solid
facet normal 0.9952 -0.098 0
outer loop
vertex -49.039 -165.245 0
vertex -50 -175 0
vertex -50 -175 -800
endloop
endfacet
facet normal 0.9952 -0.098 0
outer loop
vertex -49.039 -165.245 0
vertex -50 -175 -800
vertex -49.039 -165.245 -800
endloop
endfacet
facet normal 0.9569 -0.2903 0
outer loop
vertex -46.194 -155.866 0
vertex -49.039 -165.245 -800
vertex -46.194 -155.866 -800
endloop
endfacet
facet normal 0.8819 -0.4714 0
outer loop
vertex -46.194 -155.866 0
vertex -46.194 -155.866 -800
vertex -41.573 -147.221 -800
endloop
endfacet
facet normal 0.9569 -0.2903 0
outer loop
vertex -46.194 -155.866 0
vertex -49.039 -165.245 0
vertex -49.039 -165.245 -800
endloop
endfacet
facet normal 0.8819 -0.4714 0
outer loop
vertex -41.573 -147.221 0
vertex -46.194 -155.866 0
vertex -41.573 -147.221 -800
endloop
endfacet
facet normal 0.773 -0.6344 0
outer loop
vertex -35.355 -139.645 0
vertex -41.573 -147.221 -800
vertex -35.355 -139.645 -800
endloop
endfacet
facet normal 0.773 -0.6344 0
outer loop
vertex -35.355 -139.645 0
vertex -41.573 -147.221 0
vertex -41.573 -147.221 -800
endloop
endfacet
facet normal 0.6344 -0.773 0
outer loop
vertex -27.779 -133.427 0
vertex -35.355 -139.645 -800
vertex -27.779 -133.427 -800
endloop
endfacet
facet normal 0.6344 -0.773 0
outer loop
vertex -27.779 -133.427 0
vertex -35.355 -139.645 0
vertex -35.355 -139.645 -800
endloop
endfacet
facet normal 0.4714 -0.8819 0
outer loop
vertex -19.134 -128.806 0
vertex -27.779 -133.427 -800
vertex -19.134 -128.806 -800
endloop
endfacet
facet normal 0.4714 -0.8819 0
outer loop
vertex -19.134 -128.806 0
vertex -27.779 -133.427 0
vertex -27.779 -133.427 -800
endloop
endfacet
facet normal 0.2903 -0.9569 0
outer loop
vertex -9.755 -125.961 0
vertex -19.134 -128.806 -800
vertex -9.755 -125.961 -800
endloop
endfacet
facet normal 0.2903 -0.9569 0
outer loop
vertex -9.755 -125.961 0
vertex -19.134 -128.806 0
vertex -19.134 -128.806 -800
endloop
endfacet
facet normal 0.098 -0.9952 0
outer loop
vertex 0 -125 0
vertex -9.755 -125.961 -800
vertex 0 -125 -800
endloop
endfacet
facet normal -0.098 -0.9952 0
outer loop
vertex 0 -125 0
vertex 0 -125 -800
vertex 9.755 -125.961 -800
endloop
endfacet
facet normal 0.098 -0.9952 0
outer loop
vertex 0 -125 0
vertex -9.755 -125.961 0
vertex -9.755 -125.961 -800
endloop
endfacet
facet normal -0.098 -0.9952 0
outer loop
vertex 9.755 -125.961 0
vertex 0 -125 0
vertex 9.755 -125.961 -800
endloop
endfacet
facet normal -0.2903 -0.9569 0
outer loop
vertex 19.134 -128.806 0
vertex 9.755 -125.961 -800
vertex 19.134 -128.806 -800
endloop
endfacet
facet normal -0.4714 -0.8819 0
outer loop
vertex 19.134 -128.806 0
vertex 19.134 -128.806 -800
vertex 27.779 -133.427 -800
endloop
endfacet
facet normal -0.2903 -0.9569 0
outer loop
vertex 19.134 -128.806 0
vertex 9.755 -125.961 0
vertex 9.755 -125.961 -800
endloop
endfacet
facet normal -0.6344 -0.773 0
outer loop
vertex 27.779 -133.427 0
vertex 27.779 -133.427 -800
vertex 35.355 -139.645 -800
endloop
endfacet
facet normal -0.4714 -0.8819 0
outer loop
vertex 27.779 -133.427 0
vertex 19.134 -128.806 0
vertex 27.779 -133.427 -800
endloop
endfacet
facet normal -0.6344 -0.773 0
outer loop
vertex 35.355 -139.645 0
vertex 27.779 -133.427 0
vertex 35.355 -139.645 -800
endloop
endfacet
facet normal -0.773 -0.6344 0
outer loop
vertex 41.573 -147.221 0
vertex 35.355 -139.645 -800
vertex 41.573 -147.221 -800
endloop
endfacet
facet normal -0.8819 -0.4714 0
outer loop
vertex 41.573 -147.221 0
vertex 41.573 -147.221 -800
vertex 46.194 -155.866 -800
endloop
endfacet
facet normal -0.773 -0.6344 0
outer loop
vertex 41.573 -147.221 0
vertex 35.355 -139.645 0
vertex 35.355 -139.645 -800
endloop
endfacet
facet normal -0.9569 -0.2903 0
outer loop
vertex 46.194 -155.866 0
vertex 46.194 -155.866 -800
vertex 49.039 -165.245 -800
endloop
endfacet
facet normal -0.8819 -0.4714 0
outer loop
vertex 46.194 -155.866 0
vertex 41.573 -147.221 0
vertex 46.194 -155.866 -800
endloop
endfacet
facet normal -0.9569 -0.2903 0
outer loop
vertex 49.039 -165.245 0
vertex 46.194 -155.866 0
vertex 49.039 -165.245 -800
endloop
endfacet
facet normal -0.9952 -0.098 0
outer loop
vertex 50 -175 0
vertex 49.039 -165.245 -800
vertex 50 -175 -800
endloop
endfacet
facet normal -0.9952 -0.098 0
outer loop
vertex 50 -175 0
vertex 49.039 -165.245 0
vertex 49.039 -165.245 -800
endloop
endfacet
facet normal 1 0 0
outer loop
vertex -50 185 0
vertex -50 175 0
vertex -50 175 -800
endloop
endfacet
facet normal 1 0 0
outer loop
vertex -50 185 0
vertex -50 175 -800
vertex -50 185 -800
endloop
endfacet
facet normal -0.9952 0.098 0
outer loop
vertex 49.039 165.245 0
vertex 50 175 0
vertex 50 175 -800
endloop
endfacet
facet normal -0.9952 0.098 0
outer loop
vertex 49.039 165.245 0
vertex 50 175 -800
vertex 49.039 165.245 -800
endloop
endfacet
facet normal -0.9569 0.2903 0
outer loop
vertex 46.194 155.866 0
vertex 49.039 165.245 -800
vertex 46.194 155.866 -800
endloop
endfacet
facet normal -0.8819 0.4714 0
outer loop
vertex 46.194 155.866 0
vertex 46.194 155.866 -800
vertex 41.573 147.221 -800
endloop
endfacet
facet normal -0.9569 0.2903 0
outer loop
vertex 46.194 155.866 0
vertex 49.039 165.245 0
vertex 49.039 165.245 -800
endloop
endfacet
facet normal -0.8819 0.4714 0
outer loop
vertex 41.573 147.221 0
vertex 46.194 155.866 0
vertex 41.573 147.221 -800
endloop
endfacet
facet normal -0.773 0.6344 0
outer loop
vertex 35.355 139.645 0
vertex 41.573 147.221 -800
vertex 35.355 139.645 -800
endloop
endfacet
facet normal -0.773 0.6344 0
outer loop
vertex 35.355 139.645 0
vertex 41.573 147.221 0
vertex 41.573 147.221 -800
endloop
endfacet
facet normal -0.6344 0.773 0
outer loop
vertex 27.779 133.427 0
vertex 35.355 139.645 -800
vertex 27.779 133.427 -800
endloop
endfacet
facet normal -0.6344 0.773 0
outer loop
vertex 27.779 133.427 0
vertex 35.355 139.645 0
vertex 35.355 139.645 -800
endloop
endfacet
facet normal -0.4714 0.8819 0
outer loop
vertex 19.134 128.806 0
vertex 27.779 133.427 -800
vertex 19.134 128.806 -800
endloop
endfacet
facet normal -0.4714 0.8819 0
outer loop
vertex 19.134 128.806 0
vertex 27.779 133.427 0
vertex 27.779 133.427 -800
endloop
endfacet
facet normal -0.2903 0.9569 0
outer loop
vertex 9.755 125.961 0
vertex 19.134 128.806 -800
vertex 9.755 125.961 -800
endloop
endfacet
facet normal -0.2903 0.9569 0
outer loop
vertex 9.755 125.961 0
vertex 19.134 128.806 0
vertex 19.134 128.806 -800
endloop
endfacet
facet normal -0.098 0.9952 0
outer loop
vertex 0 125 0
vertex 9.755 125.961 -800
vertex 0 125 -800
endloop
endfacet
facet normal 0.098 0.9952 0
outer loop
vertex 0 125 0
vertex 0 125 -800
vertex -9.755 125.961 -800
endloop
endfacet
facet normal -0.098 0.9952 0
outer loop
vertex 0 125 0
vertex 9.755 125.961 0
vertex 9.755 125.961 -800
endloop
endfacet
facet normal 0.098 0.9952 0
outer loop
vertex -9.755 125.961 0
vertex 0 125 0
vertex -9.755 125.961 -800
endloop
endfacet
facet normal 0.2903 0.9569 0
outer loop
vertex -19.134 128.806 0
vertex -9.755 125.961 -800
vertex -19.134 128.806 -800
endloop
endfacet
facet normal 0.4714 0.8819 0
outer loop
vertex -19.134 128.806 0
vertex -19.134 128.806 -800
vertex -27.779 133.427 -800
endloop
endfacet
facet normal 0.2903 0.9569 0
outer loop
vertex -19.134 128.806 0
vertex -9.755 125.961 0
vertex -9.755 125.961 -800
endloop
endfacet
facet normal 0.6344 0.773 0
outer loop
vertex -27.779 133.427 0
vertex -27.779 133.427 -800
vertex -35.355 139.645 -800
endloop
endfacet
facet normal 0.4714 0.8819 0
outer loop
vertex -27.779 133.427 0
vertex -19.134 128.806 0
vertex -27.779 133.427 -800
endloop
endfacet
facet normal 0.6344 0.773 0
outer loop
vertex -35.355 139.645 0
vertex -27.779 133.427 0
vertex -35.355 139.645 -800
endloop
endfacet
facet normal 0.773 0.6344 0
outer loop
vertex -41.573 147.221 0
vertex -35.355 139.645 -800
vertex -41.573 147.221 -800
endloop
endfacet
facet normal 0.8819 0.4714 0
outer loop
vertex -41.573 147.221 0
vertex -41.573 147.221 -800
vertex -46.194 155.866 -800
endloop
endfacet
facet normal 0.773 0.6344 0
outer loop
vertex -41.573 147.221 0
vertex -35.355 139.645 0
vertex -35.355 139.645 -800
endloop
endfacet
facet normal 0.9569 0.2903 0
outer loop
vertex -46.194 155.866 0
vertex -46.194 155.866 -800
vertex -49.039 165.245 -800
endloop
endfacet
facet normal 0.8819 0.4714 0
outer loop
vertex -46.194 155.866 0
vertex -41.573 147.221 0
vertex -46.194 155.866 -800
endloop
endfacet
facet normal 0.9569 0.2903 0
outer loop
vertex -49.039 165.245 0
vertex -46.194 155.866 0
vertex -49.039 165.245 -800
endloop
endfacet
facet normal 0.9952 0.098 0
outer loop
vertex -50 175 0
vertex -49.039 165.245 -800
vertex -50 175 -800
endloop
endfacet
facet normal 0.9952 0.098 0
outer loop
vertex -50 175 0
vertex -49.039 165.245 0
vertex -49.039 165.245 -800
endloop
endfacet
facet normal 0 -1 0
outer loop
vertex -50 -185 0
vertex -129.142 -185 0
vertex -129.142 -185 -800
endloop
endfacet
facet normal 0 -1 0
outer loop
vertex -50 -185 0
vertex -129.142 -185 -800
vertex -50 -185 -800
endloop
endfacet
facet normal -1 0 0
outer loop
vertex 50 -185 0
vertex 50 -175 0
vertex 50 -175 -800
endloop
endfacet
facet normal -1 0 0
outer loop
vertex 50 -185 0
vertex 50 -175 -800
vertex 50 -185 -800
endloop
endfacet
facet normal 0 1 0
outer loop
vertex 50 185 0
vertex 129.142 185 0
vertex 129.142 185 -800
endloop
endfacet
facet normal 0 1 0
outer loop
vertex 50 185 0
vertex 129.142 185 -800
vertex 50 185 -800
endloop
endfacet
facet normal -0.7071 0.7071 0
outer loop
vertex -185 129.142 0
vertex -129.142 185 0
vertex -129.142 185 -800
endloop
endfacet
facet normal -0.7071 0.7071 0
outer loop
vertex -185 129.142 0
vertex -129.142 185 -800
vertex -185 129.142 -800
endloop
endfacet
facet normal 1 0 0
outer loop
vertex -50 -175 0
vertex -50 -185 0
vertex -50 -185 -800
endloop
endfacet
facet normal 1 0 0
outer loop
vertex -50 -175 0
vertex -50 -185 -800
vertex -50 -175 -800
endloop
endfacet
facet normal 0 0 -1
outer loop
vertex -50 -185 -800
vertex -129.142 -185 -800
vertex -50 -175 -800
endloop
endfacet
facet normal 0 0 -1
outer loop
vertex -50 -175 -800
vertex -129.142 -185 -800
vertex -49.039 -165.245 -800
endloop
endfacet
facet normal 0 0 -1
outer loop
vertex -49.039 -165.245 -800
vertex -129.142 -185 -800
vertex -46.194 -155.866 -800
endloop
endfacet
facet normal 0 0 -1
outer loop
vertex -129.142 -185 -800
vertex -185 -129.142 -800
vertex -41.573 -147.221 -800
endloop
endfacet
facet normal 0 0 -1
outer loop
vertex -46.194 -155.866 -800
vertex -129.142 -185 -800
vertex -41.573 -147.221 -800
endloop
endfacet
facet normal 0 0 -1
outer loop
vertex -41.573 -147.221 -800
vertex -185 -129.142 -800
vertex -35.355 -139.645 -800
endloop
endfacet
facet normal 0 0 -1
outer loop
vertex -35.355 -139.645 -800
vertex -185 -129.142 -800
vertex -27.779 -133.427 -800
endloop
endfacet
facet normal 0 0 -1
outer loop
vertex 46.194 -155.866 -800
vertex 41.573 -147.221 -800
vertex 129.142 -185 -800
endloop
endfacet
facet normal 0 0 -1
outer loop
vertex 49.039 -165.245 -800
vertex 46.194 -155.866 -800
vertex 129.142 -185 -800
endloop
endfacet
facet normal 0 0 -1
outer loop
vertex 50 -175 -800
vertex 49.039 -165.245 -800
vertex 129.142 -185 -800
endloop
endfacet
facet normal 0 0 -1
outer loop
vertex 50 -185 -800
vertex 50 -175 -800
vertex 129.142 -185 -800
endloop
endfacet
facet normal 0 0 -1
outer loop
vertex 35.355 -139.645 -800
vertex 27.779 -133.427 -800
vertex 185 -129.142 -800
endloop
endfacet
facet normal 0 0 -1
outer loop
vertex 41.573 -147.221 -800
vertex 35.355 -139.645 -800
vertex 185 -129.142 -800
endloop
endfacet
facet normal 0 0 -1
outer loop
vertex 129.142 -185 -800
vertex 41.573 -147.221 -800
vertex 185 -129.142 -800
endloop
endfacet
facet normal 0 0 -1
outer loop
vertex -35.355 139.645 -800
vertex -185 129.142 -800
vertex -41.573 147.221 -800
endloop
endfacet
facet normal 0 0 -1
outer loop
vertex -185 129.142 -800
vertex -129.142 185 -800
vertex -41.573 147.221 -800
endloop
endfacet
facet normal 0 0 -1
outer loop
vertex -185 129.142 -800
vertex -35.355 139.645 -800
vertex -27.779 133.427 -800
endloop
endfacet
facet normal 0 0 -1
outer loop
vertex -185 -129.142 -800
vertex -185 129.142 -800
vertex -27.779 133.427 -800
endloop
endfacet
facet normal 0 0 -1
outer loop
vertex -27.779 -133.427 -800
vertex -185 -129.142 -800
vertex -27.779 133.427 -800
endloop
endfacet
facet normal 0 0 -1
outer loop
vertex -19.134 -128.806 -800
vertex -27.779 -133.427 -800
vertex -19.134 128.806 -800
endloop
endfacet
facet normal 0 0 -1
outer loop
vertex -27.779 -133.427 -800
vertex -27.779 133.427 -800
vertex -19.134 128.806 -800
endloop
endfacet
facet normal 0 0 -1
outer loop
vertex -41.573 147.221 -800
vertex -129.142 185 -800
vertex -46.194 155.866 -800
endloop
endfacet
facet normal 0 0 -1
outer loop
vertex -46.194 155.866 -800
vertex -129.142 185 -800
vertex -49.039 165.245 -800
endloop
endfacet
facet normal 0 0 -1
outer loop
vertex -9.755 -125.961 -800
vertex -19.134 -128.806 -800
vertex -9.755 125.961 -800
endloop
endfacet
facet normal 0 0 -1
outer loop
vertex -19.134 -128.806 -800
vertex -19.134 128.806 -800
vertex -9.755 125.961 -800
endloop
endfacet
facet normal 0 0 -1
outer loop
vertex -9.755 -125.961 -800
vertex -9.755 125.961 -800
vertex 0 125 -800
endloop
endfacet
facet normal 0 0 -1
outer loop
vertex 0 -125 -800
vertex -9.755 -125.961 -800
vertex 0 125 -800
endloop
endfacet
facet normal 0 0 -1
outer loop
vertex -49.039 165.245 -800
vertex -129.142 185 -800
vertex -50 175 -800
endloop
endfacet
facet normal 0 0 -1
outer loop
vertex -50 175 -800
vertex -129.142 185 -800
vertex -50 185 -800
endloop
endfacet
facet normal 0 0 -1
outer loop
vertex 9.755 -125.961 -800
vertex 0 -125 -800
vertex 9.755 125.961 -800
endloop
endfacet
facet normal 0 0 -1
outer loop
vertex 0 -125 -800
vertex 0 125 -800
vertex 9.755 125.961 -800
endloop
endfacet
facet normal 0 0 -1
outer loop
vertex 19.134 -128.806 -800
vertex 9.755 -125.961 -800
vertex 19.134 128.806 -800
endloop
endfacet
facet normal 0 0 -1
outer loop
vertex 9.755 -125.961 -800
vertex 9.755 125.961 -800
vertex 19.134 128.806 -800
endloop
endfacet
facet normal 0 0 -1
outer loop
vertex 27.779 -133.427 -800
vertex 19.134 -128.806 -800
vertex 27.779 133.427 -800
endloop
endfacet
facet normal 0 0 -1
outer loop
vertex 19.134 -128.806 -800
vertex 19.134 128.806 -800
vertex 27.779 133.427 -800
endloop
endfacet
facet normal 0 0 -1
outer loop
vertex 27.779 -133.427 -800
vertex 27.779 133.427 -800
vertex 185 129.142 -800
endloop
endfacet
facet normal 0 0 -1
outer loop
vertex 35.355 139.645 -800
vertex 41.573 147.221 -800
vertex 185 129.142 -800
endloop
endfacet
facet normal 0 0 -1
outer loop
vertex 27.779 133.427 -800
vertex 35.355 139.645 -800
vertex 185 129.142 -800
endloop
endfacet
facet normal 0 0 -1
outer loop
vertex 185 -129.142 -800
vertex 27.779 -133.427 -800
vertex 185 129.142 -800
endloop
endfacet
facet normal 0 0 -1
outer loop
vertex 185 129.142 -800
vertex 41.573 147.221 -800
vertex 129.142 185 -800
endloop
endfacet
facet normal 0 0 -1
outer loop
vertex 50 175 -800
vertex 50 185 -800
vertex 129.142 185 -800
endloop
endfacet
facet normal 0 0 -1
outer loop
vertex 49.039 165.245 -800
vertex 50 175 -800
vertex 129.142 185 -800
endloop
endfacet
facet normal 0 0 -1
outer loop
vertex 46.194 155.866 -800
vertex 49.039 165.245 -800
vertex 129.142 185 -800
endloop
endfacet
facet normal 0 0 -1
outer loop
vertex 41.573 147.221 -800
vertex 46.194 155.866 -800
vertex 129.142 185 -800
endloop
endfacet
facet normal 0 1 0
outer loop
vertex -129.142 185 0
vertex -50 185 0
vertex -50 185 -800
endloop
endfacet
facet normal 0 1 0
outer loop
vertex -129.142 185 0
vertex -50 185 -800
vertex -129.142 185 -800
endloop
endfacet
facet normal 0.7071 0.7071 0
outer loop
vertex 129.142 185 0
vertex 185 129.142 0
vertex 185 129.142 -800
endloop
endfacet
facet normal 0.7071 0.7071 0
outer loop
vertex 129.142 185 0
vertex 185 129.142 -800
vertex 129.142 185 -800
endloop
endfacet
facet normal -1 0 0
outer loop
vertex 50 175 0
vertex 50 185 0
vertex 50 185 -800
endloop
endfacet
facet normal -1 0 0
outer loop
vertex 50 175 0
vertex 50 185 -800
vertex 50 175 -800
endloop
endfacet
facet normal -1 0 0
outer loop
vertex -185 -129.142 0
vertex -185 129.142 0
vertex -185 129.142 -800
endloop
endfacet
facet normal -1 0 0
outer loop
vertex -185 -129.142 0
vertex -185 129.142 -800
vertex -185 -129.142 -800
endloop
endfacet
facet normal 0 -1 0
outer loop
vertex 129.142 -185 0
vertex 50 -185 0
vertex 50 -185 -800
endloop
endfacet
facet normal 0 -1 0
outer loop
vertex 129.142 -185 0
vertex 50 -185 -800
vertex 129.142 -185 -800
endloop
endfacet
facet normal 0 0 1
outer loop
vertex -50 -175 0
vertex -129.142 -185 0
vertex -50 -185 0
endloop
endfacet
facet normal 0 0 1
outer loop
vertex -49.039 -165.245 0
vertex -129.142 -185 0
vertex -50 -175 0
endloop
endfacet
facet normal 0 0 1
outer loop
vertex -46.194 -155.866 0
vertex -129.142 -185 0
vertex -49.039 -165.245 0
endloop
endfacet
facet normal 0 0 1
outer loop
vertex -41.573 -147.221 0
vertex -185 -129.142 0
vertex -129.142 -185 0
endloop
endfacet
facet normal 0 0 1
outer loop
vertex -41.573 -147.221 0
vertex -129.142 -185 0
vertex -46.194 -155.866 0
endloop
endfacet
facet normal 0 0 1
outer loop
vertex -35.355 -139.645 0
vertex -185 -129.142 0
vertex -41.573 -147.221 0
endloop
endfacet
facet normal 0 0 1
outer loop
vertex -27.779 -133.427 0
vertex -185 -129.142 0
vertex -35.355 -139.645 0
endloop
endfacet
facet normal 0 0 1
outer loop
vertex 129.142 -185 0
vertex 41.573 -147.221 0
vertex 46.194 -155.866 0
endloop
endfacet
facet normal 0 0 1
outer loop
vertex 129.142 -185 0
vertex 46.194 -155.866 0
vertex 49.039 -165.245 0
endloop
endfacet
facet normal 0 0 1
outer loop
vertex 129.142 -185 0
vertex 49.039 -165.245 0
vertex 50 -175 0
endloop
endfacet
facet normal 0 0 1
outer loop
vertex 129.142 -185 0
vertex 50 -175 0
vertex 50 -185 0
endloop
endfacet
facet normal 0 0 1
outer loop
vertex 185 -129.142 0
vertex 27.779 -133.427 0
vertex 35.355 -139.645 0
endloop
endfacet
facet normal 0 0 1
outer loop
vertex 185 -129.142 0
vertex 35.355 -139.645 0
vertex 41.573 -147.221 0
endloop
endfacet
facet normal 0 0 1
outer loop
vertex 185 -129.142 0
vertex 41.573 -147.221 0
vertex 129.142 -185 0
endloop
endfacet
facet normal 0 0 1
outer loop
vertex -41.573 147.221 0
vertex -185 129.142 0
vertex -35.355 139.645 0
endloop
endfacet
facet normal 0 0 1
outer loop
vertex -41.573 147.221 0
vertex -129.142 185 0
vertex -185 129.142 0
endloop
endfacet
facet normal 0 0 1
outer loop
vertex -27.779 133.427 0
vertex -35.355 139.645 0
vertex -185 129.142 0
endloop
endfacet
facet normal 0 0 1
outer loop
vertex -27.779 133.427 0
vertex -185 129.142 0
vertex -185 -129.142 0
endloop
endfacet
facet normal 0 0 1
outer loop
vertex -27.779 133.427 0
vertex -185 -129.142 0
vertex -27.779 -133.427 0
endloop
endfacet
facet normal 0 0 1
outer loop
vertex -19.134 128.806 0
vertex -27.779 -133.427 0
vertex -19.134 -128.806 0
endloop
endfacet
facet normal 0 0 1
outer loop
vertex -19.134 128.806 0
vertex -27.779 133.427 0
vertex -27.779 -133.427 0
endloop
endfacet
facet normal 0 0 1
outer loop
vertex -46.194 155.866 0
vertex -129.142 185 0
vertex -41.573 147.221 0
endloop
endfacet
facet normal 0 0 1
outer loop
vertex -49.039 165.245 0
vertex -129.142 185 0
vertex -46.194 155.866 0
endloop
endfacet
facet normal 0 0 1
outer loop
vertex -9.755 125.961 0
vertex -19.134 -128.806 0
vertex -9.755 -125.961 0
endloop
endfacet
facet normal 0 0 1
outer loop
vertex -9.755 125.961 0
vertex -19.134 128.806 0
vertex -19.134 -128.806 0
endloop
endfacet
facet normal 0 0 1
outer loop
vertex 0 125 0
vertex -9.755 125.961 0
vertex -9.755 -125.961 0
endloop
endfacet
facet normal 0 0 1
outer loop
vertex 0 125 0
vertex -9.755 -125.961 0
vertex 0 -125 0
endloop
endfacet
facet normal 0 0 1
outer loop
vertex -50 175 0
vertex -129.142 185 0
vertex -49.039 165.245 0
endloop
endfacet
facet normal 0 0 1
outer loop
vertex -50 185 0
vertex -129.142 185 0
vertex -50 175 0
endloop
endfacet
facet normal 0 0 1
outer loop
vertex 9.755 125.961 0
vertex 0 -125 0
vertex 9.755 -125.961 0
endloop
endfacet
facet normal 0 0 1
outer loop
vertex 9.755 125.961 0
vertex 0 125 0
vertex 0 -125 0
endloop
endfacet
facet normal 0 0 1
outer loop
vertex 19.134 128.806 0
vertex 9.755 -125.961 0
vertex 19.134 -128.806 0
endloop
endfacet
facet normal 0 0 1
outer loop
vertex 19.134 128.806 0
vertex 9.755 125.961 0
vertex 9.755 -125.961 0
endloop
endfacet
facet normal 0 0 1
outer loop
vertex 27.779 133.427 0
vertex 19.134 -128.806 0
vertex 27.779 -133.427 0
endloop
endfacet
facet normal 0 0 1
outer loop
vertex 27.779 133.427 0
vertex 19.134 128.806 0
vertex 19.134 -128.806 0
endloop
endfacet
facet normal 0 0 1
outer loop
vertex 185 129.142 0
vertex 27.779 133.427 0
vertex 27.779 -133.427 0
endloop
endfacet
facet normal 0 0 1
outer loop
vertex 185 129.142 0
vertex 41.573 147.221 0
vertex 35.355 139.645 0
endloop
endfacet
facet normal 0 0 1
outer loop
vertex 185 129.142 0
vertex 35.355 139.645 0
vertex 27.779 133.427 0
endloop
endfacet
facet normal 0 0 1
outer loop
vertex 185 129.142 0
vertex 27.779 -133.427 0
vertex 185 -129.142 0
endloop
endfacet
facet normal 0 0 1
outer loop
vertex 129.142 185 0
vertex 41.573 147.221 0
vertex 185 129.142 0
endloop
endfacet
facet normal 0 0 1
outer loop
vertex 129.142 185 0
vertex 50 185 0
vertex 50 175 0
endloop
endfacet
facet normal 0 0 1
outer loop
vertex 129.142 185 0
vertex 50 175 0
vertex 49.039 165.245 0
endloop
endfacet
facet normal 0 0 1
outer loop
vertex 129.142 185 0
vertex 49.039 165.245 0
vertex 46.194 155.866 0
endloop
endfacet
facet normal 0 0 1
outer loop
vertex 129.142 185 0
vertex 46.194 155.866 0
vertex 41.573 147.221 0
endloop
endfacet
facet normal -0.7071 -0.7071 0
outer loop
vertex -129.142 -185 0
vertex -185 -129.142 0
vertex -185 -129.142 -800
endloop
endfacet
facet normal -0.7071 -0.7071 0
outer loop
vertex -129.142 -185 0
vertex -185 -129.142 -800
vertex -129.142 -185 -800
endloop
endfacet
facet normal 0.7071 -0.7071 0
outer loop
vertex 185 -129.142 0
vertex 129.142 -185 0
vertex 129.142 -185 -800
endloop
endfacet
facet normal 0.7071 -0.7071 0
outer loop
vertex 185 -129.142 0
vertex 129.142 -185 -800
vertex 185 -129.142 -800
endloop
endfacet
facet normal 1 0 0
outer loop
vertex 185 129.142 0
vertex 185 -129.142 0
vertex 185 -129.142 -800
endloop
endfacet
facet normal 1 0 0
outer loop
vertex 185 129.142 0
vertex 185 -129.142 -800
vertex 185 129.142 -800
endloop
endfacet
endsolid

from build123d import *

# Parameters (mm, degrees)
BOSS_EXTRUDE1_DEPTH = 800


with BuildPart() as part:
    # Sketch1 → Boss-Extrude1 (new body)
    with BuildSketch(Plane.XY):
        with BuildLine():
            Line((-185, 129.142135624), (-185, -129.142135624))
            Line((-185, -129.142135624), (-129.142135624, -185))
            Line((-129.142135624, -185), (-50, -185))
            Line((-50, -185), (-50, -175))
            ThreePointArc((-50, -175), (0, -125), (50, -175))
            Line((50, -175), (50, -185))
            Line((50, -185), (129.142135624, -185))
            Line((129.142135624, -185), (185, -129.142135624))
            Line((185, -129.142135624), (185, 129.142135624))
            Line((185, 129.142135624), (129.142135624, 185))
            Line((129.142135624, 185), (50, 185))
            Line((50, 185), (50, 175))
            ThreePointArc((50, 175), (0, 125), (-50, 175))
            Line((-50, 175), (-50, 185))
            Line((-50, 185), (-129.142135624, 185))
            Line((-129.142135624, 185), (-185, 129.142135624))
        make_face()
    extrude(amount=-BOSS_EXTRUDE1_DEPTH)


solid = part.part
